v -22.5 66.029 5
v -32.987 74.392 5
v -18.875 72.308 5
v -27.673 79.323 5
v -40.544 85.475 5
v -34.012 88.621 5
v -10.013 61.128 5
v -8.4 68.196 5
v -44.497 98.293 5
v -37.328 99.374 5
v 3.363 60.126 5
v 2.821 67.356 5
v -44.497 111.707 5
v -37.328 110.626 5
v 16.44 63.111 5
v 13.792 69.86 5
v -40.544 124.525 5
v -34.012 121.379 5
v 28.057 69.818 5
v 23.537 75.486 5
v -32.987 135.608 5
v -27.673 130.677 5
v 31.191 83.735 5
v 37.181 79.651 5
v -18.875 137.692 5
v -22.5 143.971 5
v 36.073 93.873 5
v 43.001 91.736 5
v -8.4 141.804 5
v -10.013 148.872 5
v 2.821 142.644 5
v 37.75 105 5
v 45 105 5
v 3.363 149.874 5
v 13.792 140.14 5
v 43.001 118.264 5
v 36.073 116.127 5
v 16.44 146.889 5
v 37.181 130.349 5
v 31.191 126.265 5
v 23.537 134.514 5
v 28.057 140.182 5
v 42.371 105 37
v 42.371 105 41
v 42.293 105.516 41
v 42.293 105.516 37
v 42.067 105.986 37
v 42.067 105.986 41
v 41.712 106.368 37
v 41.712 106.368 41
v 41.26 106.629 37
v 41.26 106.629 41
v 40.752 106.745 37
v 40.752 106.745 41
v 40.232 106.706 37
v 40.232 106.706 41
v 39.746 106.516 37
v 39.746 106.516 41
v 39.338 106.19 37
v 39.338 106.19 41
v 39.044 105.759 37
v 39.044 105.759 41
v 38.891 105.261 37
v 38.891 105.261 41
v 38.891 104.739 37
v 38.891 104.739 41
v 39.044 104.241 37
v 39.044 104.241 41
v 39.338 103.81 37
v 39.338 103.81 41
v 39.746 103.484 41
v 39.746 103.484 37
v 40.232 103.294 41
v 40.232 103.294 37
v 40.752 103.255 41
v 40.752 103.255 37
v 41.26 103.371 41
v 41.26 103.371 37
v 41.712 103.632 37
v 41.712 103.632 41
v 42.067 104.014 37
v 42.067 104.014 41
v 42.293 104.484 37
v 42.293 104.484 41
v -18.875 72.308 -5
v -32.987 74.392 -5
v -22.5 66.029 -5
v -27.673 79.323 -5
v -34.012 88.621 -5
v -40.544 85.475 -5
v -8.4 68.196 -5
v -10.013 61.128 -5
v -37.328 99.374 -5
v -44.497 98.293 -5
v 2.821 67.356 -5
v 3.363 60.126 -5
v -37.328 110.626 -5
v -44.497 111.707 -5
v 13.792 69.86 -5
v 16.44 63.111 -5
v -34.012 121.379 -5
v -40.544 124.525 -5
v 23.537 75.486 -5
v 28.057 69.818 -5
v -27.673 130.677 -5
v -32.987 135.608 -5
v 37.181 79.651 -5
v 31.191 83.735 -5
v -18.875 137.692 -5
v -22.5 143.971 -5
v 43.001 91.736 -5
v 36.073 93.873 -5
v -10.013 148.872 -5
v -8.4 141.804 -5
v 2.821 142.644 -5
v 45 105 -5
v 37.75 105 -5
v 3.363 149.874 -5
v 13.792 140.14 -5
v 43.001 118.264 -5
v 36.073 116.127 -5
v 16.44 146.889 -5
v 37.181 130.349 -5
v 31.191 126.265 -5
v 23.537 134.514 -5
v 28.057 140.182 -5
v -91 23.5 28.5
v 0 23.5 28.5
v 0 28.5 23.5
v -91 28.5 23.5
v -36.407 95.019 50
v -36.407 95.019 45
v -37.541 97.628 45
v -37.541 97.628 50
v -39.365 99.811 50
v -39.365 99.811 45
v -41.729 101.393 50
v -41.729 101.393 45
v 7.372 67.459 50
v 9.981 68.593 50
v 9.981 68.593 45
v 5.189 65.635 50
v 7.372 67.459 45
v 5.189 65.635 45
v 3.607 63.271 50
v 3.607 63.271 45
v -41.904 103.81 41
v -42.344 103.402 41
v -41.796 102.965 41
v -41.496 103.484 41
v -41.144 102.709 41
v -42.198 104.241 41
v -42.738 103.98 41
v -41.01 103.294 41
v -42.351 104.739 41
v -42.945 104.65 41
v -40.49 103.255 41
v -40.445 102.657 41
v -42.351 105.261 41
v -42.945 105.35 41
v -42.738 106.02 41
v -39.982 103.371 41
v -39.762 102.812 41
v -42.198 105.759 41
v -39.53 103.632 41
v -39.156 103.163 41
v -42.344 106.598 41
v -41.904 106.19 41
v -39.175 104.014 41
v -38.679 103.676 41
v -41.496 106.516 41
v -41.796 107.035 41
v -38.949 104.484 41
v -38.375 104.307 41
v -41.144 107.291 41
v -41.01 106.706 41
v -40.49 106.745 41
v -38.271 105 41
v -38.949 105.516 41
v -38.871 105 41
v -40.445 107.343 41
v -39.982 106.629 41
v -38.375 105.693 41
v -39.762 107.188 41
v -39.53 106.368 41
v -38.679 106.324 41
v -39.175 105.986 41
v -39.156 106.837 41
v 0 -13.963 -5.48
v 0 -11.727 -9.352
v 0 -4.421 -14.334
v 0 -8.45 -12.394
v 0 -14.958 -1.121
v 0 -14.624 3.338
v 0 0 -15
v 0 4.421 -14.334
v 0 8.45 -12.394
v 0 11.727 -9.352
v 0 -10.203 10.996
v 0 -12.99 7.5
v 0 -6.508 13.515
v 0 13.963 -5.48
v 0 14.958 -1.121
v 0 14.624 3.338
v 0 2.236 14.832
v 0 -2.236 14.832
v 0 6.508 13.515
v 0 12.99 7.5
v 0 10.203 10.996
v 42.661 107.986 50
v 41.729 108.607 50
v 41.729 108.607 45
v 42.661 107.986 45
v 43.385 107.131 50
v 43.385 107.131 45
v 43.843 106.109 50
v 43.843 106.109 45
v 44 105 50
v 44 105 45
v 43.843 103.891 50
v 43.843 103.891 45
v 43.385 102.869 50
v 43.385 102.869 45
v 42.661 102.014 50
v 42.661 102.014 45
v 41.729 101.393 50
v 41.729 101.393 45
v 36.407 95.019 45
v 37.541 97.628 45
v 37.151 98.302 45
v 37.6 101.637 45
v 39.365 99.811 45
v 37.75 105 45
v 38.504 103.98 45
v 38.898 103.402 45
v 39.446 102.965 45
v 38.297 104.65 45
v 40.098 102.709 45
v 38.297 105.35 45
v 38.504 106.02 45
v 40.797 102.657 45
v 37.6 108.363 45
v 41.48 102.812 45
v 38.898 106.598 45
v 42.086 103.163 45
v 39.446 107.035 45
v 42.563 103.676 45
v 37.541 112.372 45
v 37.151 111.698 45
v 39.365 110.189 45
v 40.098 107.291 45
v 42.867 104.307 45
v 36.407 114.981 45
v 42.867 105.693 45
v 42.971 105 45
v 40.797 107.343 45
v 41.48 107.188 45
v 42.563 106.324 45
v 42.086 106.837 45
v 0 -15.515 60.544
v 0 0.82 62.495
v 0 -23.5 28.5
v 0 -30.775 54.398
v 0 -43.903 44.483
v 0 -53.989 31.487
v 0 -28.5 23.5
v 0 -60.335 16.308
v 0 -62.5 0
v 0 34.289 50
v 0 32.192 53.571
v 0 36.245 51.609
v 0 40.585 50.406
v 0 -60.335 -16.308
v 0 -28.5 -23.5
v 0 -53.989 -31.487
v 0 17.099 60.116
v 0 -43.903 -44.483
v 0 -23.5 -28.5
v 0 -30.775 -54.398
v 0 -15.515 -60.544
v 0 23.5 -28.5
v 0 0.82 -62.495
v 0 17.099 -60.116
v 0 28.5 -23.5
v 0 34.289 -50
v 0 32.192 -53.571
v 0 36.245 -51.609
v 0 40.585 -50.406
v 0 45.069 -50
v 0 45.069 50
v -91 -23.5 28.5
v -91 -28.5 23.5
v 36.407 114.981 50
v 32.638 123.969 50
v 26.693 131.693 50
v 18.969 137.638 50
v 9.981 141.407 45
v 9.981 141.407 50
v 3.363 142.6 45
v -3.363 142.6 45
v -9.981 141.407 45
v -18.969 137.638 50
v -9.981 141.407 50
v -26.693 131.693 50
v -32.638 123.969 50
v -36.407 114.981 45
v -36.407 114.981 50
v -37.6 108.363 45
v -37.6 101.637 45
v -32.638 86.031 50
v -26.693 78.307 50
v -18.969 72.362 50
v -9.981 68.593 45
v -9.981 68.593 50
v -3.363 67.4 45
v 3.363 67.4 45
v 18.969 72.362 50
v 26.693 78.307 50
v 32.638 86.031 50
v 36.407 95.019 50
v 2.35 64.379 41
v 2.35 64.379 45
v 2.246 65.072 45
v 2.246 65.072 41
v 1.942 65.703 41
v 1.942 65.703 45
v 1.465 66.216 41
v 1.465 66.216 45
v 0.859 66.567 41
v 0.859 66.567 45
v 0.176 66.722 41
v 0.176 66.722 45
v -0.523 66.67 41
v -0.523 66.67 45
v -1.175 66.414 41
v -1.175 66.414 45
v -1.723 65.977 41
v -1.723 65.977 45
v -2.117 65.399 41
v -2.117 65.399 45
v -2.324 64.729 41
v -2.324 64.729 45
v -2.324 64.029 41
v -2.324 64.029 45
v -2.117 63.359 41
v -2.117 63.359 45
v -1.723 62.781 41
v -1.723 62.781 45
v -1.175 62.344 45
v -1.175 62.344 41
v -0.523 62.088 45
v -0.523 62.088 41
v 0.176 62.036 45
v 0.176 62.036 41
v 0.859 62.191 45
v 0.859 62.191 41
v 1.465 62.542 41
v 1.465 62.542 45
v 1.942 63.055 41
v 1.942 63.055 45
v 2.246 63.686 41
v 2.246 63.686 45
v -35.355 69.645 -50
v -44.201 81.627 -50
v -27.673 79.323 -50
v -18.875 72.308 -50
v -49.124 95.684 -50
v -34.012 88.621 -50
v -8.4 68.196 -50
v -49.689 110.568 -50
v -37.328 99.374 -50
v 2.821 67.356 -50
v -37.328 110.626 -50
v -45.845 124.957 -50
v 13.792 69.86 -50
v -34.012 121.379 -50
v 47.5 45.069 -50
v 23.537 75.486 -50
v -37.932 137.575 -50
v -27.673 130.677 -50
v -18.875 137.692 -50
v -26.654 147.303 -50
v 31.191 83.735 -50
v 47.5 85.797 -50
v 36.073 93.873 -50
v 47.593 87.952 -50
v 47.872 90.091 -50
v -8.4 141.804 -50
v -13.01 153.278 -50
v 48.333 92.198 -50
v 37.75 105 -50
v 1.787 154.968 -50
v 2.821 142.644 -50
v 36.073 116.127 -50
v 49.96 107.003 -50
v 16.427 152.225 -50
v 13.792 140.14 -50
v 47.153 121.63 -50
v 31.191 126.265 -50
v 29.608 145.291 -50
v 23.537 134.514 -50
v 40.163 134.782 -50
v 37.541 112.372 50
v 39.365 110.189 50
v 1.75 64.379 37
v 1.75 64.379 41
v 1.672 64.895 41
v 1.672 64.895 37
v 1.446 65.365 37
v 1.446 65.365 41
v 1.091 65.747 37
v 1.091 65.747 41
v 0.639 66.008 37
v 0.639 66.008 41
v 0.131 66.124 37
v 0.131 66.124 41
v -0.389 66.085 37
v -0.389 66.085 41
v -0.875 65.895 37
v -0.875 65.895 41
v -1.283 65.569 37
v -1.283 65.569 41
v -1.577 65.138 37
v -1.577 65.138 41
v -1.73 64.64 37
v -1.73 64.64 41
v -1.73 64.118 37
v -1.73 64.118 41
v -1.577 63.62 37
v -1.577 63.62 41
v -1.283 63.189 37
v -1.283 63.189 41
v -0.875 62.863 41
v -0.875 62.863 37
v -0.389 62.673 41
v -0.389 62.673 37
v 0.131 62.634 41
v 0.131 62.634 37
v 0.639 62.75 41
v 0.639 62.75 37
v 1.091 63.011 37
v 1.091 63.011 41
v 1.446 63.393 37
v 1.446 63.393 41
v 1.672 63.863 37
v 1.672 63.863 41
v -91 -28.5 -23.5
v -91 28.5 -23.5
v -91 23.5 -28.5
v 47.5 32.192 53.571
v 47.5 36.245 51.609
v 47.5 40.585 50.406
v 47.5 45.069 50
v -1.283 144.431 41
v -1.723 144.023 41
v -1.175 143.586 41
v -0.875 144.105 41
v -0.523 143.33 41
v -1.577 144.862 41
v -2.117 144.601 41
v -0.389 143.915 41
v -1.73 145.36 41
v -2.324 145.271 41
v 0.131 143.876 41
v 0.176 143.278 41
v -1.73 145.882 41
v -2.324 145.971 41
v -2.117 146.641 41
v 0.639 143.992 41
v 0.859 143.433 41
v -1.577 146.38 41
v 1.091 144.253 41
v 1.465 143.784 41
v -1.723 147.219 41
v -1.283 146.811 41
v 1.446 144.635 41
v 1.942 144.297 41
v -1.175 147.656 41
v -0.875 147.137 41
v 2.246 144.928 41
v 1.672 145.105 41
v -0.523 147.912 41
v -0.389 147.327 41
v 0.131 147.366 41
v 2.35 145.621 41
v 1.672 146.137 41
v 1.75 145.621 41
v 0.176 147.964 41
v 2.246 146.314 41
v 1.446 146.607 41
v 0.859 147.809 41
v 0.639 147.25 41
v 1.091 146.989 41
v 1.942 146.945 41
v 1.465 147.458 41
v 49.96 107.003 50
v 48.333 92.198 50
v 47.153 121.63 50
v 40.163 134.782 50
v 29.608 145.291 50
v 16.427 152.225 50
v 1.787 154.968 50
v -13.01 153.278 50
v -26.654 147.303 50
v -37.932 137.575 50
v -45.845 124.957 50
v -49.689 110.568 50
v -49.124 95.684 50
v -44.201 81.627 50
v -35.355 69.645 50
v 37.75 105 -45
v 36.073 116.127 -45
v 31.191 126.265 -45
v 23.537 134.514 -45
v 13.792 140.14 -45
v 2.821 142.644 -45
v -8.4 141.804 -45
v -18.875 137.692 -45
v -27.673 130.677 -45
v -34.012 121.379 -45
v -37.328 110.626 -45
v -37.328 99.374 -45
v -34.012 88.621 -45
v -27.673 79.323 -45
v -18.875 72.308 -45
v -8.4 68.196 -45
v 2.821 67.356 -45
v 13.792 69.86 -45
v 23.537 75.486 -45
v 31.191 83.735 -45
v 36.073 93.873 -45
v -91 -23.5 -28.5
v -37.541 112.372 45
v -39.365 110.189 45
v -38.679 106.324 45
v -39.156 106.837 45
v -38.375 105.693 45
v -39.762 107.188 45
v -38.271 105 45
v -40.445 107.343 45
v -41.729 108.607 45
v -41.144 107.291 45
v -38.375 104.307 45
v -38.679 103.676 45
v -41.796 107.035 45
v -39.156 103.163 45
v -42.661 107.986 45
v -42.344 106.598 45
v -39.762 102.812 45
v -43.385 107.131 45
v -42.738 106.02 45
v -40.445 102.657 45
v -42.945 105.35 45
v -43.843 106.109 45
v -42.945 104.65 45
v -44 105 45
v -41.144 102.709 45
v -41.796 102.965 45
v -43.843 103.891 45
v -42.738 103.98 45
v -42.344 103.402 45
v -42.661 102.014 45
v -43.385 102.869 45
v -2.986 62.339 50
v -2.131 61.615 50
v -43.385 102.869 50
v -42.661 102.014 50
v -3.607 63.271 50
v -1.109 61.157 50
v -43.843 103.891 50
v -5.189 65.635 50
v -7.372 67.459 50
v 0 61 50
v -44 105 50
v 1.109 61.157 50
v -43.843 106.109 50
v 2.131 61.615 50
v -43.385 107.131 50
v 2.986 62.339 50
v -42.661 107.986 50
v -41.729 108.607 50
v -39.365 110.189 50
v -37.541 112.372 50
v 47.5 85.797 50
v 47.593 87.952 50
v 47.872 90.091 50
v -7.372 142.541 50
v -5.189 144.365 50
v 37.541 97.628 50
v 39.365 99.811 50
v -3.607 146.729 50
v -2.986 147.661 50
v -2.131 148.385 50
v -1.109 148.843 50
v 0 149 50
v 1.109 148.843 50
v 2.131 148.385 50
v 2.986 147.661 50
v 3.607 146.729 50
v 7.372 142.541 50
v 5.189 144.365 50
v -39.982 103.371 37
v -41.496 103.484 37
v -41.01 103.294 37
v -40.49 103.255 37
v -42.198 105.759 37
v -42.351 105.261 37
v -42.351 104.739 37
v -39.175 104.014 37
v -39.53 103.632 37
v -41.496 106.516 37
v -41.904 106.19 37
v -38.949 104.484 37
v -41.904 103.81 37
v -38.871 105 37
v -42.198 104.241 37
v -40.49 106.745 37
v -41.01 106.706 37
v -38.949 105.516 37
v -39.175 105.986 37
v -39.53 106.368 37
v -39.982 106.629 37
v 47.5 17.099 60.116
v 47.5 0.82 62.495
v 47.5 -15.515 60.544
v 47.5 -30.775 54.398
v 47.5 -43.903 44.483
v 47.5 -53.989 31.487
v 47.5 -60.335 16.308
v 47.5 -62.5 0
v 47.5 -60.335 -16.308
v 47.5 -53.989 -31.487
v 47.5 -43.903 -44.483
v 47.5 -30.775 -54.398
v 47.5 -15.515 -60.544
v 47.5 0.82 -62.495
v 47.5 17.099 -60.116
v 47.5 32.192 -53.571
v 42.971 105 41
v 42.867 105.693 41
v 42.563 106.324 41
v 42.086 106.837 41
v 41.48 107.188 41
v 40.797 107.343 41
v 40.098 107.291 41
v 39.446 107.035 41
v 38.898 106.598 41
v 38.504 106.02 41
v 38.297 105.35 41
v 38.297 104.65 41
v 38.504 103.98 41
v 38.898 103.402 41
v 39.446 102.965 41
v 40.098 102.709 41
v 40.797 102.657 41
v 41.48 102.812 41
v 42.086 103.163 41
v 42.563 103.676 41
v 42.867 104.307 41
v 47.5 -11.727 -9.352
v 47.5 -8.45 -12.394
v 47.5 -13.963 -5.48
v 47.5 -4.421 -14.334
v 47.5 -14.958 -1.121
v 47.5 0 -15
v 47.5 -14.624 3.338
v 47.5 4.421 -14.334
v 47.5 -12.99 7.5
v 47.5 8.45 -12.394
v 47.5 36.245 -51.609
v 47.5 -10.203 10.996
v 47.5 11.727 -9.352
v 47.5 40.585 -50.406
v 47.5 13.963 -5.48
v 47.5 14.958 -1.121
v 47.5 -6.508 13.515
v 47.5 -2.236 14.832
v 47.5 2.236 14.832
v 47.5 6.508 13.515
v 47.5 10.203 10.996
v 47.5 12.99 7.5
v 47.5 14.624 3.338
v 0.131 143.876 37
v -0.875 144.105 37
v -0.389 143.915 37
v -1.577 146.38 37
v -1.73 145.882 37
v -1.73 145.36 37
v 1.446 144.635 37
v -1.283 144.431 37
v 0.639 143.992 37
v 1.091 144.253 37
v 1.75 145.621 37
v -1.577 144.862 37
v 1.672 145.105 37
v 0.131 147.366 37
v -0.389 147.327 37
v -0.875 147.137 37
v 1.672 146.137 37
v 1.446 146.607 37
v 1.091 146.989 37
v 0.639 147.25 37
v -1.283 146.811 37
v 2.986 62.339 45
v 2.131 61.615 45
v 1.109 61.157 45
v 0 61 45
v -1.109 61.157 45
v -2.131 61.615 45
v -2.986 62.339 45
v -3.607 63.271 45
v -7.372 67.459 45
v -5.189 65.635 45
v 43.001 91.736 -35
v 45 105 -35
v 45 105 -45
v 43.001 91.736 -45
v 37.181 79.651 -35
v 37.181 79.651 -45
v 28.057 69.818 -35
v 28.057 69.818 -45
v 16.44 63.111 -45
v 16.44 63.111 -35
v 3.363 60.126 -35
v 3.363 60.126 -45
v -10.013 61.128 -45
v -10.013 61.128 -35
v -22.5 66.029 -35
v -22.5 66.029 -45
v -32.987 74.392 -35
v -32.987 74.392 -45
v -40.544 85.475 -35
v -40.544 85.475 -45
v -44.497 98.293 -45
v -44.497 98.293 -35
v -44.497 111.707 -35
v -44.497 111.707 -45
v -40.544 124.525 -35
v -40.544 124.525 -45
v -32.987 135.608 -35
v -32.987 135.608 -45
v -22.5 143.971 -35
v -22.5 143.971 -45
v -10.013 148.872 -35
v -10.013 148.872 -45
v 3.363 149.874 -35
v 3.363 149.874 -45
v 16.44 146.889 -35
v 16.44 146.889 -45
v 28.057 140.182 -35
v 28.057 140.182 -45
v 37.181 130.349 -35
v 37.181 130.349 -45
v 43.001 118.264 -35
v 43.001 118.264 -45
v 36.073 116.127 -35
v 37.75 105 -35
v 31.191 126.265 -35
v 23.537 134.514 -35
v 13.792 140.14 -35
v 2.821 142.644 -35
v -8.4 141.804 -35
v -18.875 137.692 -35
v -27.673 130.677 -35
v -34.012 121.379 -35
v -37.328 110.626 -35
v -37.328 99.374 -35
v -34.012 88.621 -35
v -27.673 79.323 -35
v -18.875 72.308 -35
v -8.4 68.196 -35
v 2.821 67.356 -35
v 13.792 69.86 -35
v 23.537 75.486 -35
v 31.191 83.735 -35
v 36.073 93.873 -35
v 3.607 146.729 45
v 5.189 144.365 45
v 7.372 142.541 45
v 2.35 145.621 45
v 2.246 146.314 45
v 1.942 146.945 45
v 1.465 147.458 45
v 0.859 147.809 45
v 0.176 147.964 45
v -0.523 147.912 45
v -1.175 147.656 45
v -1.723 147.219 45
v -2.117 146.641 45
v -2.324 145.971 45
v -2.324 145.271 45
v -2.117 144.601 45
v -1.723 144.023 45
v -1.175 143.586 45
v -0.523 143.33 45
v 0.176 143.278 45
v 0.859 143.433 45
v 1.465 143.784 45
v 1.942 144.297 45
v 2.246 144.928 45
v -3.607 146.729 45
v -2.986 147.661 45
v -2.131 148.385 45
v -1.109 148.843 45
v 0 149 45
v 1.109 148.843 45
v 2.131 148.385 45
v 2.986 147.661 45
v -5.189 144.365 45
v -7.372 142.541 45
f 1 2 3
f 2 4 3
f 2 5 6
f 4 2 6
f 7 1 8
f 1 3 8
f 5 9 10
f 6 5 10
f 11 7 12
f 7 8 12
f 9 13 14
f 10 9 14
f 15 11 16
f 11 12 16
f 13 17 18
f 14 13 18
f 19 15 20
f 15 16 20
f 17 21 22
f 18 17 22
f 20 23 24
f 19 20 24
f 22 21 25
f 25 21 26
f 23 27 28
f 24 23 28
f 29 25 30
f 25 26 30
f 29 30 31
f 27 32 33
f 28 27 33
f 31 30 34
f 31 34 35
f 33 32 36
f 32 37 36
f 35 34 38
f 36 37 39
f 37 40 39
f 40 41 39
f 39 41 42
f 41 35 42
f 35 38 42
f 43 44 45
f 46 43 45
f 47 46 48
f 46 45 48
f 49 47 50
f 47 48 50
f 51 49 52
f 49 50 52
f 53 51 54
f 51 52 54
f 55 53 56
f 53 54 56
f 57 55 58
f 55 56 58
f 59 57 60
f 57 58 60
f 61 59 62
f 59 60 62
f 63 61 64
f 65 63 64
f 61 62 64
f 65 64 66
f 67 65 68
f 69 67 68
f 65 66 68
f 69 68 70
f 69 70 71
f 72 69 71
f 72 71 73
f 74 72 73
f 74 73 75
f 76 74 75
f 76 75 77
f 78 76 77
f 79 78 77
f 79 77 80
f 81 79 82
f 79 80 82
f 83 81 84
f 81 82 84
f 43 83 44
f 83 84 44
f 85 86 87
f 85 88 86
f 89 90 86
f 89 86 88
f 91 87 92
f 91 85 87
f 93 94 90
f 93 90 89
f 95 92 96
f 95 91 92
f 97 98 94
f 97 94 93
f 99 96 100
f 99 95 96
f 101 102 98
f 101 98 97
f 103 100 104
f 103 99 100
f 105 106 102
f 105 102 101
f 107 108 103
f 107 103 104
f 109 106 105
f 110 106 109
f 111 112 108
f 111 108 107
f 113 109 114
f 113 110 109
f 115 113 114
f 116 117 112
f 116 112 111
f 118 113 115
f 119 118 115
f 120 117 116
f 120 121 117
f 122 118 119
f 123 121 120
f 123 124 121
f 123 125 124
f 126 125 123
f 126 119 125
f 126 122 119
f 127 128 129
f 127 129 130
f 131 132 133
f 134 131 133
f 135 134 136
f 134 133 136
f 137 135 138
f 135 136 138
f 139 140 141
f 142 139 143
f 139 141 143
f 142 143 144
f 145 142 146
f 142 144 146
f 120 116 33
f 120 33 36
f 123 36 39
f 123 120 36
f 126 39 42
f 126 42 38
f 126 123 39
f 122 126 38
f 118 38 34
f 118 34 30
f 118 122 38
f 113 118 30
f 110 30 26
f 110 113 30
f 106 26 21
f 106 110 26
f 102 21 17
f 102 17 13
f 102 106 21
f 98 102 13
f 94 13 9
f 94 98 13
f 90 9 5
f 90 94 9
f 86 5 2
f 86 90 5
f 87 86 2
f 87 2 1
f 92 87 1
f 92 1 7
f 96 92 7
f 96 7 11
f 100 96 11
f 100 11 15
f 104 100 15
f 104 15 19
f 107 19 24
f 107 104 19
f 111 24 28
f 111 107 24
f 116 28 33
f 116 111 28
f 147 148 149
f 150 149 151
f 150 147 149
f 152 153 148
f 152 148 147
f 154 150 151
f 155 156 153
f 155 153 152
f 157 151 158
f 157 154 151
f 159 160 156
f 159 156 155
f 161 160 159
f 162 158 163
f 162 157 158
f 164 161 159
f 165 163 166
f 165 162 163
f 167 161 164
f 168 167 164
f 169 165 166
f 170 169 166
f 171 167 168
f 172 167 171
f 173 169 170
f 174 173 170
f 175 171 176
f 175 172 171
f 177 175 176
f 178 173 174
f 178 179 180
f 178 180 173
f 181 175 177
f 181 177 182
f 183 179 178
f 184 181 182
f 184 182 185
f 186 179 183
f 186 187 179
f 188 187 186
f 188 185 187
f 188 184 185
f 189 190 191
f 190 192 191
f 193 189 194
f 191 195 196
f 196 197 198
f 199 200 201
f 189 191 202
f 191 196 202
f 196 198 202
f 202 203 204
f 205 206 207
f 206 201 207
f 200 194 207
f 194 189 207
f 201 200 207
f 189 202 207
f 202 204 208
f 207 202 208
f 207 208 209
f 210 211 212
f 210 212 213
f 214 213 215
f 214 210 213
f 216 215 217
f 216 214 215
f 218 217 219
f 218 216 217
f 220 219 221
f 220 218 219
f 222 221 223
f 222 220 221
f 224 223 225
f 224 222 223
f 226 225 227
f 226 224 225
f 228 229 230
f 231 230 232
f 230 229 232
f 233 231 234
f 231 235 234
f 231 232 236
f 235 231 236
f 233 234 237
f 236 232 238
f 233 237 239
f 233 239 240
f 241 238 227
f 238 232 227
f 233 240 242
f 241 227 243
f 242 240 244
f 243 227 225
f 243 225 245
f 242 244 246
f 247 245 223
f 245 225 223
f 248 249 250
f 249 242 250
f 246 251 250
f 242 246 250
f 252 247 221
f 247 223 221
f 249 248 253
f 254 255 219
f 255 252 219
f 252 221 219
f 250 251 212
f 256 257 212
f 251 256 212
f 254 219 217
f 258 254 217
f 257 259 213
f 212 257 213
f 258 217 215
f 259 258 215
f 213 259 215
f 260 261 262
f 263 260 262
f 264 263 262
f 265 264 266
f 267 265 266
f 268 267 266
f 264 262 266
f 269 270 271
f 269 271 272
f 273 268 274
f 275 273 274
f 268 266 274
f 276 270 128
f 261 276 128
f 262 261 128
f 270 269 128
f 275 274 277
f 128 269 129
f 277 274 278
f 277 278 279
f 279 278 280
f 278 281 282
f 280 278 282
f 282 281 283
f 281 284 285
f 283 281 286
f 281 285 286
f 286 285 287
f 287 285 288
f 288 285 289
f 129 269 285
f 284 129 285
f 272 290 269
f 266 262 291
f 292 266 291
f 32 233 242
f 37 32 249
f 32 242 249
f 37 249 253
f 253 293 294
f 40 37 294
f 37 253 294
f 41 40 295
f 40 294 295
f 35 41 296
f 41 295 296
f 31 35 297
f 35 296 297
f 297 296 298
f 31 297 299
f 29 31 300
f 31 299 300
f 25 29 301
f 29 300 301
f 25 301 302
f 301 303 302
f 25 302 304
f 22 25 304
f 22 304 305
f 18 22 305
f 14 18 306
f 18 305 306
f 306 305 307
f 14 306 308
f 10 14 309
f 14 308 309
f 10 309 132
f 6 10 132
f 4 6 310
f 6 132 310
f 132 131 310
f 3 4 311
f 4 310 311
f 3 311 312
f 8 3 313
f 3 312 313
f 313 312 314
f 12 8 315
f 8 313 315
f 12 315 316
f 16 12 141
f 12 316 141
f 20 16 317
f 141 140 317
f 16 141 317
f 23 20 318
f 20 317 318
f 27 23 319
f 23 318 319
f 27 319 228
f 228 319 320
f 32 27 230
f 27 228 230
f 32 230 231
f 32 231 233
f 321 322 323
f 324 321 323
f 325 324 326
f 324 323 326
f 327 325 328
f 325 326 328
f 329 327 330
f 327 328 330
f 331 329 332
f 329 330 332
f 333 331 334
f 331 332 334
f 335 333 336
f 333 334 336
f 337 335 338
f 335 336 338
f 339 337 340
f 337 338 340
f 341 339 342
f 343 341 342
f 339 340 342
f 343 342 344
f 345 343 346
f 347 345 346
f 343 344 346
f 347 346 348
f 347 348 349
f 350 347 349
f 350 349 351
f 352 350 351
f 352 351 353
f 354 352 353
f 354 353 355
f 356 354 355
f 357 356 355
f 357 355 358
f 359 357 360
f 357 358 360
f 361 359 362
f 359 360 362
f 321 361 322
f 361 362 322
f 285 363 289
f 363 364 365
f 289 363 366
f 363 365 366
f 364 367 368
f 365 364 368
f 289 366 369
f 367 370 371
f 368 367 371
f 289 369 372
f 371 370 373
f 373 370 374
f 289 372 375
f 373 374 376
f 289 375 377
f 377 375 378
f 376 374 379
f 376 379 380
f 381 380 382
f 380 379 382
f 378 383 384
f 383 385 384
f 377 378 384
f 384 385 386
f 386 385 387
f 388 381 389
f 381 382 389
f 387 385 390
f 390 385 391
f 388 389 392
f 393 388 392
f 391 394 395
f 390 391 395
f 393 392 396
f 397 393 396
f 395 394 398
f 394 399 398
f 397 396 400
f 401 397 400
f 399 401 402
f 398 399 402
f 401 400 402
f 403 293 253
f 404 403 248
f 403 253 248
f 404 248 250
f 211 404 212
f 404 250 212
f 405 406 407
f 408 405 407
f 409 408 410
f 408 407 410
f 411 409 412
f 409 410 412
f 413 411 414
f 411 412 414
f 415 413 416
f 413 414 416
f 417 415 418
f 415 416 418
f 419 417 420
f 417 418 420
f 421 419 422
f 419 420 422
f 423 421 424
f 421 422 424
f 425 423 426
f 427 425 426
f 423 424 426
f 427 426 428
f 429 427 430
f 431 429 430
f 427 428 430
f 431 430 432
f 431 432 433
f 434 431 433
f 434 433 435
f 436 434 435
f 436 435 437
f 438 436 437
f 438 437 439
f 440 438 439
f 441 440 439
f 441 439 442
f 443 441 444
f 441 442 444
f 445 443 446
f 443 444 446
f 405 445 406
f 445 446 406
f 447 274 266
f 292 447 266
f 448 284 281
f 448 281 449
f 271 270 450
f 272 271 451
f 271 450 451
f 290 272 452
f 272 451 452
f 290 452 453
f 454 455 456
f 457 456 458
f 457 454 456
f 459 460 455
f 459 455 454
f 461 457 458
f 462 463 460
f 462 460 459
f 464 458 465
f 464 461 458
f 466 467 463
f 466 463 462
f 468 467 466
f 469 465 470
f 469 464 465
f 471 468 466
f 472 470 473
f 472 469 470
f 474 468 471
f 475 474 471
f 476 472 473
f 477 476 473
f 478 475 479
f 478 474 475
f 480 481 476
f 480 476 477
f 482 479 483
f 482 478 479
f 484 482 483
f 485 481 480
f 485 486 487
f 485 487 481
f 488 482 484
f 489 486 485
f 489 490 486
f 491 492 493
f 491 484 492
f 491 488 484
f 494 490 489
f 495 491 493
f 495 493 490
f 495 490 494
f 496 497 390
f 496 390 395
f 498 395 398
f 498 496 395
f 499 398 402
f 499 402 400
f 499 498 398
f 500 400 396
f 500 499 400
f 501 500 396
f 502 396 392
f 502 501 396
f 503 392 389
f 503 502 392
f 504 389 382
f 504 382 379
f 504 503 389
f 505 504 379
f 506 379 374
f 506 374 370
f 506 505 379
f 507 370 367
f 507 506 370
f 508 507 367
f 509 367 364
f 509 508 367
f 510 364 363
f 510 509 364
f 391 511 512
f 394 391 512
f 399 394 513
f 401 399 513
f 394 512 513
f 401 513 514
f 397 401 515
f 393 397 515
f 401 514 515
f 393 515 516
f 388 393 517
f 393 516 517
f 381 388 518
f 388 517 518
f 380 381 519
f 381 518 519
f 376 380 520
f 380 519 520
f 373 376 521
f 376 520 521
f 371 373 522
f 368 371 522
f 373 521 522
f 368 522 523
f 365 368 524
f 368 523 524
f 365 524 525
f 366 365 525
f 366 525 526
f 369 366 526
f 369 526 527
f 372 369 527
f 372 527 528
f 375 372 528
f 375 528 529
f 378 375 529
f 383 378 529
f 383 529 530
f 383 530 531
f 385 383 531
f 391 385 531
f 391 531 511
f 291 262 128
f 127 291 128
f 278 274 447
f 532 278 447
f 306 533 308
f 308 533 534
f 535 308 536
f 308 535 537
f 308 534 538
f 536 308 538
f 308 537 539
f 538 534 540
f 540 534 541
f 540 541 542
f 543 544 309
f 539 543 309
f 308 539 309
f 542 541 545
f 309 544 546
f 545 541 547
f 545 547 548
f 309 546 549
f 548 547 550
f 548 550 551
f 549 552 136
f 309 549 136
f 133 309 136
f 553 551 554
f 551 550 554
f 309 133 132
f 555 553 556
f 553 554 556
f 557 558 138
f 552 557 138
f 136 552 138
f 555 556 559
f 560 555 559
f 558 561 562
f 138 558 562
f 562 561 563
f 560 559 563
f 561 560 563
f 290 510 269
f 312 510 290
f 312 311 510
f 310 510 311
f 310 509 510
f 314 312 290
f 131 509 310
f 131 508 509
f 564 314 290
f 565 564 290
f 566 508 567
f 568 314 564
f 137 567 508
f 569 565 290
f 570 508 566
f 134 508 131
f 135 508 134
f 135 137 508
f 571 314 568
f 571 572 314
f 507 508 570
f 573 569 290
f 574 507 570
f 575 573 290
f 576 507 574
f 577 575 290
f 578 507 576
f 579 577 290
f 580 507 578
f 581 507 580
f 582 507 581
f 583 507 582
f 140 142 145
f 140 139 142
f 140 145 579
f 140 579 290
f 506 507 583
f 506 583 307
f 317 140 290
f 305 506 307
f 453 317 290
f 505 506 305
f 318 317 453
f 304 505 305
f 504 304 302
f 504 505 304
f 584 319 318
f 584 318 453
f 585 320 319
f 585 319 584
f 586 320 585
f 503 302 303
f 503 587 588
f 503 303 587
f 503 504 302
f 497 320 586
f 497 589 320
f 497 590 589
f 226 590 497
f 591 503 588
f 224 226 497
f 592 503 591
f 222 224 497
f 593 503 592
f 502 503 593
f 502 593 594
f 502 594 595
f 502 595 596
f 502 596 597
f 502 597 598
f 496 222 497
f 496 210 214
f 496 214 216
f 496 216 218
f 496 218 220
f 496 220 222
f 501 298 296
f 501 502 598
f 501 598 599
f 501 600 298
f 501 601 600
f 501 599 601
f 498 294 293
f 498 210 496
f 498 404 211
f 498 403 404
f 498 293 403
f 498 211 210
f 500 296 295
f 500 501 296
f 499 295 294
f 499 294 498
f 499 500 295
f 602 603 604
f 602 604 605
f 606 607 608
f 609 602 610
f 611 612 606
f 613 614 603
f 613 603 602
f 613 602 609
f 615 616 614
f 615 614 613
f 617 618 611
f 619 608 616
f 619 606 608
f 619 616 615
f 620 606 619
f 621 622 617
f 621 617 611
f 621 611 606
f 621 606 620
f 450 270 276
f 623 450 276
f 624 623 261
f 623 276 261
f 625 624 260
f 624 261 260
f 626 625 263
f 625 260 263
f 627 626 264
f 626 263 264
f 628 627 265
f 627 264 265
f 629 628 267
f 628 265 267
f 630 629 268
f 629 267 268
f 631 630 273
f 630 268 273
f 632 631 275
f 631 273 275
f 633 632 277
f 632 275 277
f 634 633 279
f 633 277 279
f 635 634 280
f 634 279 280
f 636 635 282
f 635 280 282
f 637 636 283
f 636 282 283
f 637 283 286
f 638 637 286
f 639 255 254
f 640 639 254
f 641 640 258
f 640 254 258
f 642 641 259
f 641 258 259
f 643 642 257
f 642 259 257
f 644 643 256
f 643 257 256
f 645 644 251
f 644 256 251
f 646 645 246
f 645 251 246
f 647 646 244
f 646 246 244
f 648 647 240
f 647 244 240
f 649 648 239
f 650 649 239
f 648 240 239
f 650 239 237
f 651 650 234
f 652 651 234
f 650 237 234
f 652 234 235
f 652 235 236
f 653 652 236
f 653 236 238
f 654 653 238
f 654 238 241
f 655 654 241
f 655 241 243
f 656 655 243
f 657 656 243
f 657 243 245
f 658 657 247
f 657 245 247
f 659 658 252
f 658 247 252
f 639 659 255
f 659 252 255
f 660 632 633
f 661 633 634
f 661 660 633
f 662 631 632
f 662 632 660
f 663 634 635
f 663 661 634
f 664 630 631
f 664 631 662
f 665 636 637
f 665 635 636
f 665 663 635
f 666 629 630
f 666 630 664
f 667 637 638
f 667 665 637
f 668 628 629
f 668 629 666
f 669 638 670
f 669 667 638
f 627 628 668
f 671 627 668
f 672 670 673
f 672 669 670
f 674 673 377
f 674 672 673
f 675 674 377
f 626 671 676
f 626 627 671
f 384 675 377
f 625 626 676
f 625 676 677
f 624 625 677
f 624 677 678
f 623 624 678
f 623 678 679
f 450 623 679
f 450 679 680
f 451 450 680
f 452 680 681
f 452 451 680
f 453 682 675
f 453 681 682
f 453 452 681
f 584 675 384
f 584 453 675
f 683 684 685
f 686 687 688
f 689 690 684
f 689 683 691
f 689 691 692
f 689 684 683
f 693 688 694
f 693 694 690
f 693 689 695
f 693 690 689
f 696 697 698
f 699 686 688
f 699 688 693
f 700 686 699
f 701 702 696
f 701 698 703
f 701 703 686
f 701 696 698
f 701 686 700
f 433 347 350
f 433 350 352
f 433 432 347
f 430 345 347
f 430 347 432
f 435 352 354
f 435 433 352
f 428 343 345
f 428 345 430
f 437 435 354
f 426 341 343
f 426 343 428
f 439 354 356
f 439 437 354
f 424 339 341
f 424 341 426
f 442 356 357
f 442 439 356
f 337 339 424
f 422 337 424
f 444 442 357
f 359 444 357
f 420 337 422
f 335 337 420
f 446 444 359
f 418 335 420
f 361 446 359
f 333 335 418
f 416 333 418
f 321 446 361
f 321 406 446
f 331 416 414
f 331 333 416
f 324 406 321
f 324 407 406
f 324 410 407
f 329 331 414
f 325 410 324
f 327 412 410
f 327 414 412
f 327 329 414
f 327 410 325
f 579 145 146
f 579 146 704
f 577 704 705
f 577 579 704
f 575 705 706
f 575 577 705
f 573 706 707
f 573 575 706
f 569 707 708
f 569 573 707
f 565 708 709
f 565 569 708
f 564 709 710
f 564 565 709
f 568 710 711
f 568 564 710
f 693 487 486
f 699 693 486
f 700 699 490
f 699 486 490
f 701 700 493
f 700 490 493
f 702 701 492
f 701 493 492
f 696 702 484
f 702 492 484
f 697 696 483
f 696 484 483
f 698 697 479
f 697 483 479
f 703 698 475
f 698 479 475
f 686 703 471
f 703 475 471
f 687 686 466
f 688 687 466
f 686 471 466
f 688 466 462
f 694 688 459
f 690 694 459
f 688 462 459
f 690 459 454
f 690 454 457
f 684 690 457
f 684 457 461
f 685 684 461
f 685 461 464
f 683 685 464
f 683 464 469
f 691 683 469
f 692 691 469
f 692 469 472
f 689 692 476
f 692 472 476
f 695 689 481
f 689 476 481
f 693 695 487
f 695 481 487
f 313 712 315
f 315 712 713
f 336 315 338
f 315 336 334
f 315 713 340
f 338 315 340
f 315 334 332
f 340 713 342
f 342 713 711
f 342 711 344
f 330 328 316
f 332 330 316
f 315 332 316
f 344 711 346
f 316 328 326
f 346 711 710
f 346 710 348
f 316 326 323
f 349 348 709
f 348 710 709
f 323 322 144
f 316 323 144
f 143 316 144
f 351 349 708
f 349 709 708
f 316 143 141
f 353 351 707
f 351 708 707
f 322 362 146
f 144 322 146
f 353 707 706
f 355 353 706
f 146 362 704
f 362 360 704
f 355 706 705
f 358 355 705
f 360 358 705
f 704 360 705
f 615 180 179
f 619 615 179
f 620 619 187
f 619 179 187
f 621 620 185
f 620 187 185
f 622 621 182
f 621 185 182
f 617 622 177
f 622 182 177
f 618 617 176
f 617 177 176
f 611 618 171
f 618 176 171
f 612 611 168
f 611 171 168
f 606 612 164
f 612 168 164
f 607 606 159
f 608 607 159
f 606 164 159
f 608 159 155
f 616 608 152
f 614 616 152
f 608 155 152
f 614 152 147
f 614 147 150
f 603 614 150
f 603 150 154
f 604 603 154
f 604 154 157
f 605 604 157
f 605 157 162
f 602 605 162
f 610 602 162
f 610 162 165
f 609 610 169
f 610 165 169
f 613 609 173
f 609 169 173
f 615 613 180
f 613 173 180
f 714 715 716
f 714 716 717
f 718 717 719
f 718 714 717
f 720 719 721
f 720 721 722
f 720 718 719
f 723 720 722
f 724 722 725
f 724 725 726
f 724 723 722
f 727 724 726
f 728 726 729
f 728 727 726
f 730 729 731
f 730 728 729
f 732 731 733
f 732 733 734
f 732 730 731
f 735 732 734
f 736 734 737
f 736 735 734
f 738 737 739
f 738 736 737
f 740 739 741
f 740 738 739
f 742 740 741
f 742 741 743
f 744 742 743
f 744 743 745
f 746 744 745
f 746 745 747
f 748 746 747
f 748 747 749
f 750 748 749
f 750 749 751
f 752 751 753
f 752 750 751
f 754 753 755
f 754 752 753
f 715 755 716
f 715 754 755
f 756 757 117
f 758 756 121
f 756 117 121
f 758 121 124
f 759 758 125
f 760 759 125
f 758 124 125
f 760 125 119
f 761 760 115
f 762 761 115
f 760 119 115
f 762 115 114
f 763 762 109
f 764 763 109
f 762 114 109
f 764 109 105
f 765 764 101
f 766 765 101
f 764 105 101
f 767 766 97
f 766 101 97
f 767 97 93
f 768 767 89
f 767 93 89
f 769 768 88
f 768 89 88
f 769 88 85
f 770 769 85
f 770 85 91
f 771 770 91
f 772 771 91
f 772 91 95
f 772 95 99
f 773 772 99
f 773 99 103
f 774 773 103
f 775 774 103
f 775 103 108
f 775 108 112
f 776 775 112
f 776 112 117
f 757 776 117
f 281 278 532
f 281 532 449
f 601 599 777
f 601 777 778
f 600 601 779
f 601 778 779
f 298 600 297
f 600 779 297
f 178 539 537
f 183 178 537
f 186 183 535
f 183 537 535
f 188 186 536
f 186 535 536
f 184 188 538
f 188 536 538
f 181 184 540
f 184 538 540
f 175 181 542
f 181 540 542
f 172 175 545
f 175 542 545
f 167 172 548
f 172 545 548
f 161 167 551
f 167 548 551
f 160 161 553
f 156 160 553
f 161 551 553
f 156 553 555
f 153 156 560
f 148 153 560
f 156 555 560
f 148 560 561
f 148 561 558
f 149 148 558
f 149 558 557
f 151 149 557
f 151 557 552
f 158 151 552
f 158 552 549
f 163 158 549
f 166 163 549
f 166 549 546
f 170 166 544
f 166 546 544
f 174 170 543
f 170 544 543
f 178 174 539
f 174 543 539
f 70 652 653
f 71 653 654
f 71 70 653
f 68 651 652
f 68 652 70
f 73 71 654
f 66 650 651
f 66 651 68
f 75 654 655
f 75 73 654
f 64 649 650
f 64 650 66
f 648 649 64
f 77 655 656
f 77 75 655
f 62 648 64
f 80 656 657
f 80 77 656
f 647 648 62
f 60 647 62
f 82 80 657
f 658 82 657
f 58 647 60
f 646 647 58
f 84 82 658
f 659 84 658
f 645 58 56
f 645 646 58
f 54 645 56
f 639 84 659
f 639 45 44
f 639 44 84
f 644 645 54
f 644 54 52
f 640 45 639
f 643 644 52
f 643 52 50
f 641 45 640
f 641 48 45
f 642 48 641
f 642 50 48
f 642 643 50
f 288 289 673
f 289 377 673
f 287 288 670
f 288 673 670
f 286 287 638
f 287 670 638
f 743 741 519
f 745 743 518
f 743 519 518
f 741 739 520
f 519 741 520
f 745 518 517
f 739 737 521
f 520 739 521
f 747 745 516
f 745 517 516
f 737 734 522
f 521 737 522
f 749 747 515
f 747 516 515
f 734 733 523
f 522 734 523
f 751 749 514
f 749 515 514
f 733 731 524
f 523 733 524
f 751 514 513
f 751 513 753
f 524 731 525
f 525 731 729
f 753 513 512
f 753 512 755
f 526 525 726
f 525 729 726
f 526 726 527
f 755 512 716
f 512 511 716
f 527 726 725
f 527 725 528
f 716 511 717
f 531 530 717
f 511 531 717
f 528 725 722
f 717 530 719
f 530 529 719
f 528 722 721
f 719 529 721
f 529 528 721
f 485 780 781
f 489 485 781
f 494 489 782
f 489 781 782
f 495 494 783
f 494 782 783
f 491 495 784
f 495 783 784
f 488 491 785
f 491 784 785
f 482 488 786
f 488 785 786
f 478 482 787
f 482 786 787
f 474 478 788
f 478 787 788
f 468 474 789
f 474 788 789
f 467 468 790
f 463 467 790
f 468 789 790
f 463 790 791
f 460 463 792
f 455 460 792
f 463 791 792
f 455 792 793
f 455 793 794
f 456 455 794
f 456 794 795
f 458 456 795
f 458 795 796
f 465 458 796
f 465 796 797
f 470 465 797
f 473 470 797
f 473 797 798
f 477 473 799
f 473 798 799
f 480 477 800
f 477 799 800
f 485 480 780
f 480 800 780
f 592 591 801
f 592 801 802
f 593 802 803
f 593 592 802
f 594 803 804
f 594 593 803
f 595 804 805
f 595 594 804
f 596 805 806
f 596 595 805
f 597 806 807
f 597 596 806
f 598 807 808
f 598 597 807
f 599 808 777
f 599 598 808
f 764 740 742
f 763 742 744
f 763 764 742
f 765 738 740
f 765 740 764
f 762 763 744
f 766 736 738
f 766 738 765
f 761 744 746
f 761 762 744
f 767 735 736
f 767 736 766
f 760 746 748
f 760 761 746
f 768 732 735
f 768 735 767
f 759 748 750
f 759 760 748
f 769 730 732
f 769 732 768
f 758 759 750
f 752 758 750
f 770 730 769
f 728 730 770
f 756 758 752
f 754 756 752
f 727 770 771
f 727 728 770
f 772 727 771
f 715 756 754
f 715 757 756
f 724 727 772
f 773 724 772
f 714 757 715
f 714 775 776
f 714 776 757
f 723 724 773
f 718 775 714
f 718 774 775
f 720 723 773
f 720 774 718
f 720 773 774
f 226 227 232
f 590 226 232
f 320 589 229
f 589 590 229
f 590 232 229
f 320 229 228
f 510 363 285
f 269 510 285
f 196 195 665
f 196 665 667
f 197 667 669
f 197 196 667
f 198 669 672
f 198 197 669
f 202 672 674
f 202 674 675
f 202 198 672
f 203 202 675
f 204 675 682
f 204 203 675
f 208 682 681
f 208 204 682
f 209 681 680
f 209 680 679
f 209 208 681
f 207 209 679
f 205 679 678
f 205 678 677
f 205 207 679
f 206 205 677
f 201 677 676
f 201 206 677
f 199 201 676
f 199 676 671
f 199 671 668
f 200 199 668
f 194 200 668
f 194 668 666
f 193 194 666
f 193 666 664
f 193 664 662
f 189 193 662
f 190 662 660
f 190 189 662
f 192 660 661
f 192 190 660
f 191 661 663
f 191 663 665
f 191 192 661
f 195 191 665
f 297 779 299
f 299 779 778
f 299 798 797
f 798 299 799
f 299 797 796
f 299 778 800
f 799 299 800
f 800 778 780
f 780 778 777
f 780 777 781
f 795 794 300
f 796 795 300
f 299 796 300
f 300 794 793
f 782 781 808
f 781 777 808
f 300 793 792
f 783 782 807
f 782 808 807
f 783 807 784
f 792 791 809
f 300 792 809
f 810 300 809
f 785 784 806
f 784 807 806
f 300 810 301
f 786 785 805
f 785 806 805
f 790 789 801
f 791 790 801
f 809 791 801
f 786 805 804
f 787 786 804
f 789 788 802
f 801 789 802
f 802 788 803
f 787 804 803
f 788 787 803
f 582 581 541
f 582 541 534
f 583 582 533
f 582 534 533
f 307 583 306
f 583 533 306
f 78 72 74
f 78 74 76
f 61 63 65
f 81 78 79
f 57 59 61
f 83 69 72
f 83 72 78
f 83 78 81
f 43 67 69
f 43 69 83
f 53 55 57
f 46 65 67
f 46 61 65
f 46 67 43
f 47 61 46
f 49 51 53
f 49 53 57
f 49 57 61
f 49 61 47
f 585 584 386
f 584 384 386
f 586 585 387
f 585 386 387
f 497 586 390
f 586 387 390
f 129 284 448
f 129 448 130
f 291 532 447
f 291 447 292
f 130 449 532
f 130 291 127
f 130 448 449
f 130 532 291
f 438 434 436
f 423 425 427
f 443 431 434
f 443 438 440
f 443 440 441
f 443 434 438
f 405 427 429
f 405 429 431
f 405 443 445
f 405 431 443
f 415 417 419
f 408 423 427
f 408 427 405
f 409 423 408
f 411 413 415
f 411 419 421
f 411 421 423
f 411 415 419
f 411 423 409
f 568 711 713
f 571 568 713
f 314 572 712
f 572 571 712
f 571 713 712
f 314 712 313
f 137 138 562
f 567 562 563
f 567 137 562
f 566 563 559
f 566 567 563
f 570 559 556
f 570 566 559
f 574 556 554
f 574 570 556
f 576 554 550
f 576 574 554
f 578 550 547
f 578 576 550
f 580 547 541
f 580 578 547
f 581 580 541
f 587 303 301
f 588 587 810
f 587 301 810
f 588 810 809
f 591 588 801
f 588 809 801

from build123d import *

# Parameters (mm, degrees)
SKETCH1_R                = 62.5
SKETCH1_R_2              = 15
BOSS_EXTRUDE1_DEPTH      = 47.5
SKETCH2_R                = 32.5
BOSS_EXTRUDE2_DEPTH      = 50
BOSS_EXTRUDE3_START      = -47.5
BOSS_EXTRUDE3_DEPTH      = 47.5
BOSS_EXTRUDE4_DEPTH      = 100
FILLET1_R                = 25
SKETCH5_W                = 57
SKETCH5_H                = 57
BOSS_EXTRUDE5_DEPTH      = 91
CHAMFER1_SIZE            = 5
SKETCH6_R                = 37.75
CUT_EXTRUDE1_DEPTH       = 100
CUT_EXTRUDE2_DEPTH       = 5
CUT_EXTRUDE2_DEPTH_BACK  = 5
SKETCH8_R                = 45
CUT_EXTRUDE3_DEPTH       = 5
CUT_EXTRUDE3_DEPTH_BACK  = 5
SKETCH9_R                = 45
CUT_EXTRUDE4_DEPTH       = 5
FILLET2_R                = 10
CIRPATTERN1_COUNT        = 4
FILLET2_OF_CIRPATTERN1_R = 10
SKETCH11_R               = 2.35
CUT_EXTRUDE5_DEPTH       = 4
SKETCH12_R               = 1.75
CUT_EXTRUDE6_DEPTH       = 4


with BuildPart() as part:
    # Sketch1 → Boss-Extrude1 (new body)
    with BuildSketch(Plane(origin=(0, 0, 0), x_dir=(0, 0, -1), z_dir=(1, 0, 0))):
        Circle(SKETCH1_R)
        Circle(SKETCH1_R_2, mode=Mode.SUBTRACT)
    extrude(amount=BOSS_EXTRUDE1_DEPTH)

    # Sketch2 → Boss-Extrude2 (add, symmetric)
    with BuildSketch(Plane.XY):
        with BuildLine():
            Line((-35.355339059, 69.644660941), (0, 34.289321881))
            Line((0, 34.289321881), (0, 55))
            ThreePointArc((0, 55), (19.134171618, 151.193976626), (-35.355339059, 69.644660941))
        make_face()
        with Locations((0, 105)):
            Circle(SKETCH2_R, mode=Mode.SUBTRACT)
    extrude(amount=BOSS_EXTRUDE2_DEPTH, both=True)

    # Sketch3 → Boss-Extrude3 (add)
    with BuildSketch(Plane(origin=(47.5, 0, 0), x_dir=(0, 0, -1), z_dir=(1, 0, 0)).offset(BOSS_EXTRUDE3_START)):
        with BuildLine():
            Line((-50, 55), (-50, 62.5))
            Line((-50, 62.5), (50, 62.5))
            Line((50, 62.5), (50, 55))
            Line((50, 55), (50, 37.5))
            ThreePointArc((50, 37.5), (40.792418173, 47.352176503), (29.685855218, 55))
            Line((29.685855218, 55), (-29.685855218, 55))
            ThreePointArc((-29.685855218, 55), (-40.792418173, 47.352176503), (-50, 37.5))
            Line((-50, 37.5), (-50, 55))
        make_face()
    extrude(amount=BOSS_EXTRUDE3_DEPTH)

    # Sketch4 → Boss-Extrude4 (add)
    with BuildSketch(Plane.XY.offset(50)):
        with BuildLine():
            Line((26.339134382, 62.5), (47.5, 62.5))
            Line((47.5, 62.5), (47.5, 89.387505004))
            ThreePointArc((47.5, 89.387505004), (39.291079432, 74.07733716), (26.339134382, 62.5))
        make_face()
    extrude(amount=-BOSS_EXTRUDE4_DEPTH)

    # Fillet1
    fillet1_edges = [part.edges().sort_by_distance(p)[0] for p in [
        (23.75, 37.5, 50),
        (23.75, 37.5, -50),
        (47.5, 89.387505004, 0),
    ]]
    fillet(fillet1_edges, radius=FILLET1_R)

    # Sketch5 → Boss-Extrude5 (add)
    with BuildSketch(Plane.ZY):
        Rectangle(SKETCH5_W, SKETCH5_H)
    extrude(amount=BOSS_EXTRUDE5_DEPTH)

    # Chamfer1
    chamfer1_edges = [part.edges().sort_by_distance(p)[0] for p in [
        (-45.5, -28.5, 28.5),
        (-45.5, 28.5, 28.5),
        (-45.5, 28.5, -28.5),
        (-45.5, -28.5, -28.5),
    ]]
    chamfer(chamfer1_edges, length=CHAMFER1_SIZE)

    # Sketch6 → Cut-Extrude1 (cut)
    with BuildSketch(Plane.XY.offset(50)):
        with Locations((0, 105)):
            Circle(SKETCH6_R)
    extrude(amount=-CUT_EXTRUDE1_DEPTH, mode=Mode.SUBTRACT)

    # Sketch8 → Cut-Extrude2 (cut, two sides: drawn at the far end of the back side and taken through both)
    with BuildSketch(Plane.XY.offset(-CUT_EXTRUDE2_DEPTH_BACK)):
        with Locations((0, 105)):
            Circle(SKETCH8_R)
    extrude(amount=CUT_EXTRUDE2_DEPTH + CUT_EXTRUDE2_DEPTH_BACK, mode=Mode.SUBTRACT)

    # Sketch9 → Cut-Extrude3 (cut, two sides: drawn at the far end of the back side and taken through both)
    with BuildSketch(Plane(origin=(0, 0, -40), x_dir=(-1, 0, 0), z_dir=(0, 0, -1)).offset(-CUT_EXTRUDE3_DEPTH_BACK)):
        with Locations(Location((0, 105, 0), (0, 0, 180))):
            Circle(SKETCH9_R)
    extrude(amount=CUT_EXTRUDE3_DEPTH + CUT_EXTRUDE3_DEPTH_BACK, mode=Mode.SUBTRACT)

    # Sketch10 → Cut-Extrude4 (cut)
    with BuildSketch(Plane.XY.offset(50)):
        with BuildLine():
            Line((-4, 142.399360944), (-4, 145))
            ThreePointArc((-4, 145), (0, 149), (4, 145))
            Line((4, 145), (4, 142.487163458))
            ThreePointArc((4, 142.487163458), (-0.003307195, 142.744592568), (-4, 142.399360944))
        make_face()
    cut_extrude4 = extrude(amount=-CUT_EXTRUDE4_DEPTH, mode=Mode.SUBTRACT)

    # Fillet2
    # the kernel refuses this fillet: 10 mm, written as the material it takes off along each edge
    with BuildSketch(Plane(origin=(-4, 142.537481269, 45), x_dir=(-0.9825908408243521, -0.18578277511139907, 0), z_dir=(0, 0, 1))) as fillet2_piece_1:
        with BuildLine():
            CenterArc((6.893121156, -9.967448048), FILLET2_R, 94.624278966, 49.061773925)
            Line((-1.164720332, -4.045354621), (-1.970504481, -3.453145278))
            ThreePointArc((-1.970504481, -3.453145278), (-1.440084404, -2.233865576), (-0.982590841, 0.185782775))
            Line((-0.982590841, 0.185782775), (0.0806213, 0.996744805))
            ThreePointArc((0.0806213, 0.996744805), (3.043454077, 0.877116383), (6.006286855, 0.996744805))
            Line((6.006286855, 0.996744805), (6.086908155, 0))
        make_face()
    extrude(amount=20.217270387, mode=Mode.SUBTRACT)
    with BuildSketch(Plane(origin=(4, 142.537481269, 45), x_dir=(0.9825908408243521, -0.18578277511139857, 0), z_dir=(0, 0, 1))) as fillet2_piece_2:
        with BuildLine():
            CenterArc((6.893121156, 9.967448048), FILLET2_R, 216.31394711, 49.061773925)
            Line((-1.164720332, 4.045354621), (-1.970504481, 3.453145278))
            ThreePointArc((-1.970504481, 3.453145278), (-1.440084404, 2.233865576), (-0.982590841, -0.185782775))
            Line((-0.982590841, -0.185782775), (0.0806213, -0.996744805))
            ThreePointArc((0.0806213, -0.996744805), (3.043454077, -0.877116383), (6.006286855, -0.996744805))
            Line((6.006286855, -0.996744805), (6.086908155, 0))
        make_face()
    extrude(amount=20.217270387, mode=Mode.SUBTRACT)

    # CirPattern1: Cut-Extrude4 ×4 about axis
    cirpattern1_axis = Axis((0, 105, 0), (0, 0, 1))
    for i in range(1, CIRPATTERN1_COUNT):
        add(cut_extrude4.rotate(cirpattern1_axis, i * 360 / CIRPATTERN1_COUNT), mode=Mode.SUBTRACT)

    # Fillet2 of CirPattern1
    # the kernel refuses this fillet: 10 mm, written as the material it takes off along each edge
    with BuildSketch(Plane(origin=(-37.537481269, 101, 45), x_dir=(0.1857827751113988, -0.9825908408243521, 0), z_dir=(0, 0, 1)), Plane(origin=(4, 67.462518731, 45), x_dir=(0.9825908408243522, 0.18578277511139812, 0), z_dir=(0, 0, 1)), Plane(origin=(37.537481269, 109, 45), x_dir=(-0.1857827751113974, 0.9825908408243524, 0), z_dir=(0, 0, 1))) as fillet2_of_cirpattern1_piece_1:
        with BuildLine():
            CenterArc((6.893121156, -9.967448048), FILLET2_OF_CIRPATTERN1_R, 94.624278966, 49.061773925)
            Line((-1.164720332, -4.045354621), (-1.970504481, -3.453145278))
            ThreePointArc((-1.970504481, -3.453145278), (-1.440084404, -2.233865576), (-0.982590841, 0.185782775))
            Line((-0.982590841, 0.185782775), (0.0806213, 0.996744805))
            ThreePointArc((0.0806213, 0.996744805), (3.043454077, 0.877116383), (6.006286855, 0.996744805))
            Line((6.006286855, 0.996744805), (6.086908155, 0))
        make_face()
    extrude(amount=20.217270387, mode=Mode.SUBTRACT)
    with BuildSketch(Plane(origin=(-37.537481269, 109, 45), x_dir=(0.18578277511140218, 0.9825908408243516, 0), z_dir=(0, 0, 1)), Plane(origin=(-4, 67.462518731, 45), x_dir=(-0.982590840824351, 0.1857827751114053, 0), z_dir=(0, 0, 1)), Plane(origin=(37.537481269, 101, 45), x_dir=(-0.18578277511140162, -0.9825908408243517, 0), z_dir=(0, 0, 1))) as fillet2_of_cirpattern1_piece_2:
        with BuildLine():
            CenterArc((6.893121156, 9.967448048), FILLET2_OF_CIRPATTERN1_R, 216.31394711, 49.061773925)
            Line((-1.164720332, 4.045354621), (-1.970504481, 3.453145278))
            ThreePointArc((-1.970504481, 3.453145278), (-1.440084404, 2.233865576), (-0.982590841, -0.185782775))
            Line((-0.982590841, -0.185782775), (0.0806213, -0.996744805))
            ThreePointArc((0.0806213, -0.996744805), (3.043454077, -0.877116383), (6.006286855, -0.996744805))
            Line((6.006286855, -0.996744805), (6.086908155, 0))
        make_face()
    extrude(amount=20.217270387, mode=Mode.SUBTRACT)

    # Sketch11 → Cut-Extrude5 (cut)
    with BuildSketch(Plane.XY.offset(45)):
        with Locations((0, 145.621023241)):
            Circle(SKETCH11_R)
        with Locations((40.621023241, 105)):
            Circle(SKETCH11_R)
        with Locations((0, 64.378976759)):
            Circle(SKETCH11_R)
        with Locations((-40.621023241, 105)):
            Circle(SKETCH11_R)
    extrude(amount=-CUT_EXTRUDE5_DEPTH, mode=Mode.SUBTRACT)

    # Sketch12 → Cut-Extrude6 (cut)
    with BuildSketch(Plane.XY.offset(41)):
        with Locations((0, 145.621023241)):
            Circle(SKETCH12_R)
        with Locations((40.621023241, 105)):
            Circle(SKETCH12_R)
        with Locations((0, 64.378976759)):
            Circle(SKETCH12_R)
        with Locations((-40.621023241, 105)):
            Circle(SKETCH12_R)
    extrude(amount=-CUT_EXTRUDE6_DEPTH, mode=Mode.SUBTRACT)


solid = part.part
